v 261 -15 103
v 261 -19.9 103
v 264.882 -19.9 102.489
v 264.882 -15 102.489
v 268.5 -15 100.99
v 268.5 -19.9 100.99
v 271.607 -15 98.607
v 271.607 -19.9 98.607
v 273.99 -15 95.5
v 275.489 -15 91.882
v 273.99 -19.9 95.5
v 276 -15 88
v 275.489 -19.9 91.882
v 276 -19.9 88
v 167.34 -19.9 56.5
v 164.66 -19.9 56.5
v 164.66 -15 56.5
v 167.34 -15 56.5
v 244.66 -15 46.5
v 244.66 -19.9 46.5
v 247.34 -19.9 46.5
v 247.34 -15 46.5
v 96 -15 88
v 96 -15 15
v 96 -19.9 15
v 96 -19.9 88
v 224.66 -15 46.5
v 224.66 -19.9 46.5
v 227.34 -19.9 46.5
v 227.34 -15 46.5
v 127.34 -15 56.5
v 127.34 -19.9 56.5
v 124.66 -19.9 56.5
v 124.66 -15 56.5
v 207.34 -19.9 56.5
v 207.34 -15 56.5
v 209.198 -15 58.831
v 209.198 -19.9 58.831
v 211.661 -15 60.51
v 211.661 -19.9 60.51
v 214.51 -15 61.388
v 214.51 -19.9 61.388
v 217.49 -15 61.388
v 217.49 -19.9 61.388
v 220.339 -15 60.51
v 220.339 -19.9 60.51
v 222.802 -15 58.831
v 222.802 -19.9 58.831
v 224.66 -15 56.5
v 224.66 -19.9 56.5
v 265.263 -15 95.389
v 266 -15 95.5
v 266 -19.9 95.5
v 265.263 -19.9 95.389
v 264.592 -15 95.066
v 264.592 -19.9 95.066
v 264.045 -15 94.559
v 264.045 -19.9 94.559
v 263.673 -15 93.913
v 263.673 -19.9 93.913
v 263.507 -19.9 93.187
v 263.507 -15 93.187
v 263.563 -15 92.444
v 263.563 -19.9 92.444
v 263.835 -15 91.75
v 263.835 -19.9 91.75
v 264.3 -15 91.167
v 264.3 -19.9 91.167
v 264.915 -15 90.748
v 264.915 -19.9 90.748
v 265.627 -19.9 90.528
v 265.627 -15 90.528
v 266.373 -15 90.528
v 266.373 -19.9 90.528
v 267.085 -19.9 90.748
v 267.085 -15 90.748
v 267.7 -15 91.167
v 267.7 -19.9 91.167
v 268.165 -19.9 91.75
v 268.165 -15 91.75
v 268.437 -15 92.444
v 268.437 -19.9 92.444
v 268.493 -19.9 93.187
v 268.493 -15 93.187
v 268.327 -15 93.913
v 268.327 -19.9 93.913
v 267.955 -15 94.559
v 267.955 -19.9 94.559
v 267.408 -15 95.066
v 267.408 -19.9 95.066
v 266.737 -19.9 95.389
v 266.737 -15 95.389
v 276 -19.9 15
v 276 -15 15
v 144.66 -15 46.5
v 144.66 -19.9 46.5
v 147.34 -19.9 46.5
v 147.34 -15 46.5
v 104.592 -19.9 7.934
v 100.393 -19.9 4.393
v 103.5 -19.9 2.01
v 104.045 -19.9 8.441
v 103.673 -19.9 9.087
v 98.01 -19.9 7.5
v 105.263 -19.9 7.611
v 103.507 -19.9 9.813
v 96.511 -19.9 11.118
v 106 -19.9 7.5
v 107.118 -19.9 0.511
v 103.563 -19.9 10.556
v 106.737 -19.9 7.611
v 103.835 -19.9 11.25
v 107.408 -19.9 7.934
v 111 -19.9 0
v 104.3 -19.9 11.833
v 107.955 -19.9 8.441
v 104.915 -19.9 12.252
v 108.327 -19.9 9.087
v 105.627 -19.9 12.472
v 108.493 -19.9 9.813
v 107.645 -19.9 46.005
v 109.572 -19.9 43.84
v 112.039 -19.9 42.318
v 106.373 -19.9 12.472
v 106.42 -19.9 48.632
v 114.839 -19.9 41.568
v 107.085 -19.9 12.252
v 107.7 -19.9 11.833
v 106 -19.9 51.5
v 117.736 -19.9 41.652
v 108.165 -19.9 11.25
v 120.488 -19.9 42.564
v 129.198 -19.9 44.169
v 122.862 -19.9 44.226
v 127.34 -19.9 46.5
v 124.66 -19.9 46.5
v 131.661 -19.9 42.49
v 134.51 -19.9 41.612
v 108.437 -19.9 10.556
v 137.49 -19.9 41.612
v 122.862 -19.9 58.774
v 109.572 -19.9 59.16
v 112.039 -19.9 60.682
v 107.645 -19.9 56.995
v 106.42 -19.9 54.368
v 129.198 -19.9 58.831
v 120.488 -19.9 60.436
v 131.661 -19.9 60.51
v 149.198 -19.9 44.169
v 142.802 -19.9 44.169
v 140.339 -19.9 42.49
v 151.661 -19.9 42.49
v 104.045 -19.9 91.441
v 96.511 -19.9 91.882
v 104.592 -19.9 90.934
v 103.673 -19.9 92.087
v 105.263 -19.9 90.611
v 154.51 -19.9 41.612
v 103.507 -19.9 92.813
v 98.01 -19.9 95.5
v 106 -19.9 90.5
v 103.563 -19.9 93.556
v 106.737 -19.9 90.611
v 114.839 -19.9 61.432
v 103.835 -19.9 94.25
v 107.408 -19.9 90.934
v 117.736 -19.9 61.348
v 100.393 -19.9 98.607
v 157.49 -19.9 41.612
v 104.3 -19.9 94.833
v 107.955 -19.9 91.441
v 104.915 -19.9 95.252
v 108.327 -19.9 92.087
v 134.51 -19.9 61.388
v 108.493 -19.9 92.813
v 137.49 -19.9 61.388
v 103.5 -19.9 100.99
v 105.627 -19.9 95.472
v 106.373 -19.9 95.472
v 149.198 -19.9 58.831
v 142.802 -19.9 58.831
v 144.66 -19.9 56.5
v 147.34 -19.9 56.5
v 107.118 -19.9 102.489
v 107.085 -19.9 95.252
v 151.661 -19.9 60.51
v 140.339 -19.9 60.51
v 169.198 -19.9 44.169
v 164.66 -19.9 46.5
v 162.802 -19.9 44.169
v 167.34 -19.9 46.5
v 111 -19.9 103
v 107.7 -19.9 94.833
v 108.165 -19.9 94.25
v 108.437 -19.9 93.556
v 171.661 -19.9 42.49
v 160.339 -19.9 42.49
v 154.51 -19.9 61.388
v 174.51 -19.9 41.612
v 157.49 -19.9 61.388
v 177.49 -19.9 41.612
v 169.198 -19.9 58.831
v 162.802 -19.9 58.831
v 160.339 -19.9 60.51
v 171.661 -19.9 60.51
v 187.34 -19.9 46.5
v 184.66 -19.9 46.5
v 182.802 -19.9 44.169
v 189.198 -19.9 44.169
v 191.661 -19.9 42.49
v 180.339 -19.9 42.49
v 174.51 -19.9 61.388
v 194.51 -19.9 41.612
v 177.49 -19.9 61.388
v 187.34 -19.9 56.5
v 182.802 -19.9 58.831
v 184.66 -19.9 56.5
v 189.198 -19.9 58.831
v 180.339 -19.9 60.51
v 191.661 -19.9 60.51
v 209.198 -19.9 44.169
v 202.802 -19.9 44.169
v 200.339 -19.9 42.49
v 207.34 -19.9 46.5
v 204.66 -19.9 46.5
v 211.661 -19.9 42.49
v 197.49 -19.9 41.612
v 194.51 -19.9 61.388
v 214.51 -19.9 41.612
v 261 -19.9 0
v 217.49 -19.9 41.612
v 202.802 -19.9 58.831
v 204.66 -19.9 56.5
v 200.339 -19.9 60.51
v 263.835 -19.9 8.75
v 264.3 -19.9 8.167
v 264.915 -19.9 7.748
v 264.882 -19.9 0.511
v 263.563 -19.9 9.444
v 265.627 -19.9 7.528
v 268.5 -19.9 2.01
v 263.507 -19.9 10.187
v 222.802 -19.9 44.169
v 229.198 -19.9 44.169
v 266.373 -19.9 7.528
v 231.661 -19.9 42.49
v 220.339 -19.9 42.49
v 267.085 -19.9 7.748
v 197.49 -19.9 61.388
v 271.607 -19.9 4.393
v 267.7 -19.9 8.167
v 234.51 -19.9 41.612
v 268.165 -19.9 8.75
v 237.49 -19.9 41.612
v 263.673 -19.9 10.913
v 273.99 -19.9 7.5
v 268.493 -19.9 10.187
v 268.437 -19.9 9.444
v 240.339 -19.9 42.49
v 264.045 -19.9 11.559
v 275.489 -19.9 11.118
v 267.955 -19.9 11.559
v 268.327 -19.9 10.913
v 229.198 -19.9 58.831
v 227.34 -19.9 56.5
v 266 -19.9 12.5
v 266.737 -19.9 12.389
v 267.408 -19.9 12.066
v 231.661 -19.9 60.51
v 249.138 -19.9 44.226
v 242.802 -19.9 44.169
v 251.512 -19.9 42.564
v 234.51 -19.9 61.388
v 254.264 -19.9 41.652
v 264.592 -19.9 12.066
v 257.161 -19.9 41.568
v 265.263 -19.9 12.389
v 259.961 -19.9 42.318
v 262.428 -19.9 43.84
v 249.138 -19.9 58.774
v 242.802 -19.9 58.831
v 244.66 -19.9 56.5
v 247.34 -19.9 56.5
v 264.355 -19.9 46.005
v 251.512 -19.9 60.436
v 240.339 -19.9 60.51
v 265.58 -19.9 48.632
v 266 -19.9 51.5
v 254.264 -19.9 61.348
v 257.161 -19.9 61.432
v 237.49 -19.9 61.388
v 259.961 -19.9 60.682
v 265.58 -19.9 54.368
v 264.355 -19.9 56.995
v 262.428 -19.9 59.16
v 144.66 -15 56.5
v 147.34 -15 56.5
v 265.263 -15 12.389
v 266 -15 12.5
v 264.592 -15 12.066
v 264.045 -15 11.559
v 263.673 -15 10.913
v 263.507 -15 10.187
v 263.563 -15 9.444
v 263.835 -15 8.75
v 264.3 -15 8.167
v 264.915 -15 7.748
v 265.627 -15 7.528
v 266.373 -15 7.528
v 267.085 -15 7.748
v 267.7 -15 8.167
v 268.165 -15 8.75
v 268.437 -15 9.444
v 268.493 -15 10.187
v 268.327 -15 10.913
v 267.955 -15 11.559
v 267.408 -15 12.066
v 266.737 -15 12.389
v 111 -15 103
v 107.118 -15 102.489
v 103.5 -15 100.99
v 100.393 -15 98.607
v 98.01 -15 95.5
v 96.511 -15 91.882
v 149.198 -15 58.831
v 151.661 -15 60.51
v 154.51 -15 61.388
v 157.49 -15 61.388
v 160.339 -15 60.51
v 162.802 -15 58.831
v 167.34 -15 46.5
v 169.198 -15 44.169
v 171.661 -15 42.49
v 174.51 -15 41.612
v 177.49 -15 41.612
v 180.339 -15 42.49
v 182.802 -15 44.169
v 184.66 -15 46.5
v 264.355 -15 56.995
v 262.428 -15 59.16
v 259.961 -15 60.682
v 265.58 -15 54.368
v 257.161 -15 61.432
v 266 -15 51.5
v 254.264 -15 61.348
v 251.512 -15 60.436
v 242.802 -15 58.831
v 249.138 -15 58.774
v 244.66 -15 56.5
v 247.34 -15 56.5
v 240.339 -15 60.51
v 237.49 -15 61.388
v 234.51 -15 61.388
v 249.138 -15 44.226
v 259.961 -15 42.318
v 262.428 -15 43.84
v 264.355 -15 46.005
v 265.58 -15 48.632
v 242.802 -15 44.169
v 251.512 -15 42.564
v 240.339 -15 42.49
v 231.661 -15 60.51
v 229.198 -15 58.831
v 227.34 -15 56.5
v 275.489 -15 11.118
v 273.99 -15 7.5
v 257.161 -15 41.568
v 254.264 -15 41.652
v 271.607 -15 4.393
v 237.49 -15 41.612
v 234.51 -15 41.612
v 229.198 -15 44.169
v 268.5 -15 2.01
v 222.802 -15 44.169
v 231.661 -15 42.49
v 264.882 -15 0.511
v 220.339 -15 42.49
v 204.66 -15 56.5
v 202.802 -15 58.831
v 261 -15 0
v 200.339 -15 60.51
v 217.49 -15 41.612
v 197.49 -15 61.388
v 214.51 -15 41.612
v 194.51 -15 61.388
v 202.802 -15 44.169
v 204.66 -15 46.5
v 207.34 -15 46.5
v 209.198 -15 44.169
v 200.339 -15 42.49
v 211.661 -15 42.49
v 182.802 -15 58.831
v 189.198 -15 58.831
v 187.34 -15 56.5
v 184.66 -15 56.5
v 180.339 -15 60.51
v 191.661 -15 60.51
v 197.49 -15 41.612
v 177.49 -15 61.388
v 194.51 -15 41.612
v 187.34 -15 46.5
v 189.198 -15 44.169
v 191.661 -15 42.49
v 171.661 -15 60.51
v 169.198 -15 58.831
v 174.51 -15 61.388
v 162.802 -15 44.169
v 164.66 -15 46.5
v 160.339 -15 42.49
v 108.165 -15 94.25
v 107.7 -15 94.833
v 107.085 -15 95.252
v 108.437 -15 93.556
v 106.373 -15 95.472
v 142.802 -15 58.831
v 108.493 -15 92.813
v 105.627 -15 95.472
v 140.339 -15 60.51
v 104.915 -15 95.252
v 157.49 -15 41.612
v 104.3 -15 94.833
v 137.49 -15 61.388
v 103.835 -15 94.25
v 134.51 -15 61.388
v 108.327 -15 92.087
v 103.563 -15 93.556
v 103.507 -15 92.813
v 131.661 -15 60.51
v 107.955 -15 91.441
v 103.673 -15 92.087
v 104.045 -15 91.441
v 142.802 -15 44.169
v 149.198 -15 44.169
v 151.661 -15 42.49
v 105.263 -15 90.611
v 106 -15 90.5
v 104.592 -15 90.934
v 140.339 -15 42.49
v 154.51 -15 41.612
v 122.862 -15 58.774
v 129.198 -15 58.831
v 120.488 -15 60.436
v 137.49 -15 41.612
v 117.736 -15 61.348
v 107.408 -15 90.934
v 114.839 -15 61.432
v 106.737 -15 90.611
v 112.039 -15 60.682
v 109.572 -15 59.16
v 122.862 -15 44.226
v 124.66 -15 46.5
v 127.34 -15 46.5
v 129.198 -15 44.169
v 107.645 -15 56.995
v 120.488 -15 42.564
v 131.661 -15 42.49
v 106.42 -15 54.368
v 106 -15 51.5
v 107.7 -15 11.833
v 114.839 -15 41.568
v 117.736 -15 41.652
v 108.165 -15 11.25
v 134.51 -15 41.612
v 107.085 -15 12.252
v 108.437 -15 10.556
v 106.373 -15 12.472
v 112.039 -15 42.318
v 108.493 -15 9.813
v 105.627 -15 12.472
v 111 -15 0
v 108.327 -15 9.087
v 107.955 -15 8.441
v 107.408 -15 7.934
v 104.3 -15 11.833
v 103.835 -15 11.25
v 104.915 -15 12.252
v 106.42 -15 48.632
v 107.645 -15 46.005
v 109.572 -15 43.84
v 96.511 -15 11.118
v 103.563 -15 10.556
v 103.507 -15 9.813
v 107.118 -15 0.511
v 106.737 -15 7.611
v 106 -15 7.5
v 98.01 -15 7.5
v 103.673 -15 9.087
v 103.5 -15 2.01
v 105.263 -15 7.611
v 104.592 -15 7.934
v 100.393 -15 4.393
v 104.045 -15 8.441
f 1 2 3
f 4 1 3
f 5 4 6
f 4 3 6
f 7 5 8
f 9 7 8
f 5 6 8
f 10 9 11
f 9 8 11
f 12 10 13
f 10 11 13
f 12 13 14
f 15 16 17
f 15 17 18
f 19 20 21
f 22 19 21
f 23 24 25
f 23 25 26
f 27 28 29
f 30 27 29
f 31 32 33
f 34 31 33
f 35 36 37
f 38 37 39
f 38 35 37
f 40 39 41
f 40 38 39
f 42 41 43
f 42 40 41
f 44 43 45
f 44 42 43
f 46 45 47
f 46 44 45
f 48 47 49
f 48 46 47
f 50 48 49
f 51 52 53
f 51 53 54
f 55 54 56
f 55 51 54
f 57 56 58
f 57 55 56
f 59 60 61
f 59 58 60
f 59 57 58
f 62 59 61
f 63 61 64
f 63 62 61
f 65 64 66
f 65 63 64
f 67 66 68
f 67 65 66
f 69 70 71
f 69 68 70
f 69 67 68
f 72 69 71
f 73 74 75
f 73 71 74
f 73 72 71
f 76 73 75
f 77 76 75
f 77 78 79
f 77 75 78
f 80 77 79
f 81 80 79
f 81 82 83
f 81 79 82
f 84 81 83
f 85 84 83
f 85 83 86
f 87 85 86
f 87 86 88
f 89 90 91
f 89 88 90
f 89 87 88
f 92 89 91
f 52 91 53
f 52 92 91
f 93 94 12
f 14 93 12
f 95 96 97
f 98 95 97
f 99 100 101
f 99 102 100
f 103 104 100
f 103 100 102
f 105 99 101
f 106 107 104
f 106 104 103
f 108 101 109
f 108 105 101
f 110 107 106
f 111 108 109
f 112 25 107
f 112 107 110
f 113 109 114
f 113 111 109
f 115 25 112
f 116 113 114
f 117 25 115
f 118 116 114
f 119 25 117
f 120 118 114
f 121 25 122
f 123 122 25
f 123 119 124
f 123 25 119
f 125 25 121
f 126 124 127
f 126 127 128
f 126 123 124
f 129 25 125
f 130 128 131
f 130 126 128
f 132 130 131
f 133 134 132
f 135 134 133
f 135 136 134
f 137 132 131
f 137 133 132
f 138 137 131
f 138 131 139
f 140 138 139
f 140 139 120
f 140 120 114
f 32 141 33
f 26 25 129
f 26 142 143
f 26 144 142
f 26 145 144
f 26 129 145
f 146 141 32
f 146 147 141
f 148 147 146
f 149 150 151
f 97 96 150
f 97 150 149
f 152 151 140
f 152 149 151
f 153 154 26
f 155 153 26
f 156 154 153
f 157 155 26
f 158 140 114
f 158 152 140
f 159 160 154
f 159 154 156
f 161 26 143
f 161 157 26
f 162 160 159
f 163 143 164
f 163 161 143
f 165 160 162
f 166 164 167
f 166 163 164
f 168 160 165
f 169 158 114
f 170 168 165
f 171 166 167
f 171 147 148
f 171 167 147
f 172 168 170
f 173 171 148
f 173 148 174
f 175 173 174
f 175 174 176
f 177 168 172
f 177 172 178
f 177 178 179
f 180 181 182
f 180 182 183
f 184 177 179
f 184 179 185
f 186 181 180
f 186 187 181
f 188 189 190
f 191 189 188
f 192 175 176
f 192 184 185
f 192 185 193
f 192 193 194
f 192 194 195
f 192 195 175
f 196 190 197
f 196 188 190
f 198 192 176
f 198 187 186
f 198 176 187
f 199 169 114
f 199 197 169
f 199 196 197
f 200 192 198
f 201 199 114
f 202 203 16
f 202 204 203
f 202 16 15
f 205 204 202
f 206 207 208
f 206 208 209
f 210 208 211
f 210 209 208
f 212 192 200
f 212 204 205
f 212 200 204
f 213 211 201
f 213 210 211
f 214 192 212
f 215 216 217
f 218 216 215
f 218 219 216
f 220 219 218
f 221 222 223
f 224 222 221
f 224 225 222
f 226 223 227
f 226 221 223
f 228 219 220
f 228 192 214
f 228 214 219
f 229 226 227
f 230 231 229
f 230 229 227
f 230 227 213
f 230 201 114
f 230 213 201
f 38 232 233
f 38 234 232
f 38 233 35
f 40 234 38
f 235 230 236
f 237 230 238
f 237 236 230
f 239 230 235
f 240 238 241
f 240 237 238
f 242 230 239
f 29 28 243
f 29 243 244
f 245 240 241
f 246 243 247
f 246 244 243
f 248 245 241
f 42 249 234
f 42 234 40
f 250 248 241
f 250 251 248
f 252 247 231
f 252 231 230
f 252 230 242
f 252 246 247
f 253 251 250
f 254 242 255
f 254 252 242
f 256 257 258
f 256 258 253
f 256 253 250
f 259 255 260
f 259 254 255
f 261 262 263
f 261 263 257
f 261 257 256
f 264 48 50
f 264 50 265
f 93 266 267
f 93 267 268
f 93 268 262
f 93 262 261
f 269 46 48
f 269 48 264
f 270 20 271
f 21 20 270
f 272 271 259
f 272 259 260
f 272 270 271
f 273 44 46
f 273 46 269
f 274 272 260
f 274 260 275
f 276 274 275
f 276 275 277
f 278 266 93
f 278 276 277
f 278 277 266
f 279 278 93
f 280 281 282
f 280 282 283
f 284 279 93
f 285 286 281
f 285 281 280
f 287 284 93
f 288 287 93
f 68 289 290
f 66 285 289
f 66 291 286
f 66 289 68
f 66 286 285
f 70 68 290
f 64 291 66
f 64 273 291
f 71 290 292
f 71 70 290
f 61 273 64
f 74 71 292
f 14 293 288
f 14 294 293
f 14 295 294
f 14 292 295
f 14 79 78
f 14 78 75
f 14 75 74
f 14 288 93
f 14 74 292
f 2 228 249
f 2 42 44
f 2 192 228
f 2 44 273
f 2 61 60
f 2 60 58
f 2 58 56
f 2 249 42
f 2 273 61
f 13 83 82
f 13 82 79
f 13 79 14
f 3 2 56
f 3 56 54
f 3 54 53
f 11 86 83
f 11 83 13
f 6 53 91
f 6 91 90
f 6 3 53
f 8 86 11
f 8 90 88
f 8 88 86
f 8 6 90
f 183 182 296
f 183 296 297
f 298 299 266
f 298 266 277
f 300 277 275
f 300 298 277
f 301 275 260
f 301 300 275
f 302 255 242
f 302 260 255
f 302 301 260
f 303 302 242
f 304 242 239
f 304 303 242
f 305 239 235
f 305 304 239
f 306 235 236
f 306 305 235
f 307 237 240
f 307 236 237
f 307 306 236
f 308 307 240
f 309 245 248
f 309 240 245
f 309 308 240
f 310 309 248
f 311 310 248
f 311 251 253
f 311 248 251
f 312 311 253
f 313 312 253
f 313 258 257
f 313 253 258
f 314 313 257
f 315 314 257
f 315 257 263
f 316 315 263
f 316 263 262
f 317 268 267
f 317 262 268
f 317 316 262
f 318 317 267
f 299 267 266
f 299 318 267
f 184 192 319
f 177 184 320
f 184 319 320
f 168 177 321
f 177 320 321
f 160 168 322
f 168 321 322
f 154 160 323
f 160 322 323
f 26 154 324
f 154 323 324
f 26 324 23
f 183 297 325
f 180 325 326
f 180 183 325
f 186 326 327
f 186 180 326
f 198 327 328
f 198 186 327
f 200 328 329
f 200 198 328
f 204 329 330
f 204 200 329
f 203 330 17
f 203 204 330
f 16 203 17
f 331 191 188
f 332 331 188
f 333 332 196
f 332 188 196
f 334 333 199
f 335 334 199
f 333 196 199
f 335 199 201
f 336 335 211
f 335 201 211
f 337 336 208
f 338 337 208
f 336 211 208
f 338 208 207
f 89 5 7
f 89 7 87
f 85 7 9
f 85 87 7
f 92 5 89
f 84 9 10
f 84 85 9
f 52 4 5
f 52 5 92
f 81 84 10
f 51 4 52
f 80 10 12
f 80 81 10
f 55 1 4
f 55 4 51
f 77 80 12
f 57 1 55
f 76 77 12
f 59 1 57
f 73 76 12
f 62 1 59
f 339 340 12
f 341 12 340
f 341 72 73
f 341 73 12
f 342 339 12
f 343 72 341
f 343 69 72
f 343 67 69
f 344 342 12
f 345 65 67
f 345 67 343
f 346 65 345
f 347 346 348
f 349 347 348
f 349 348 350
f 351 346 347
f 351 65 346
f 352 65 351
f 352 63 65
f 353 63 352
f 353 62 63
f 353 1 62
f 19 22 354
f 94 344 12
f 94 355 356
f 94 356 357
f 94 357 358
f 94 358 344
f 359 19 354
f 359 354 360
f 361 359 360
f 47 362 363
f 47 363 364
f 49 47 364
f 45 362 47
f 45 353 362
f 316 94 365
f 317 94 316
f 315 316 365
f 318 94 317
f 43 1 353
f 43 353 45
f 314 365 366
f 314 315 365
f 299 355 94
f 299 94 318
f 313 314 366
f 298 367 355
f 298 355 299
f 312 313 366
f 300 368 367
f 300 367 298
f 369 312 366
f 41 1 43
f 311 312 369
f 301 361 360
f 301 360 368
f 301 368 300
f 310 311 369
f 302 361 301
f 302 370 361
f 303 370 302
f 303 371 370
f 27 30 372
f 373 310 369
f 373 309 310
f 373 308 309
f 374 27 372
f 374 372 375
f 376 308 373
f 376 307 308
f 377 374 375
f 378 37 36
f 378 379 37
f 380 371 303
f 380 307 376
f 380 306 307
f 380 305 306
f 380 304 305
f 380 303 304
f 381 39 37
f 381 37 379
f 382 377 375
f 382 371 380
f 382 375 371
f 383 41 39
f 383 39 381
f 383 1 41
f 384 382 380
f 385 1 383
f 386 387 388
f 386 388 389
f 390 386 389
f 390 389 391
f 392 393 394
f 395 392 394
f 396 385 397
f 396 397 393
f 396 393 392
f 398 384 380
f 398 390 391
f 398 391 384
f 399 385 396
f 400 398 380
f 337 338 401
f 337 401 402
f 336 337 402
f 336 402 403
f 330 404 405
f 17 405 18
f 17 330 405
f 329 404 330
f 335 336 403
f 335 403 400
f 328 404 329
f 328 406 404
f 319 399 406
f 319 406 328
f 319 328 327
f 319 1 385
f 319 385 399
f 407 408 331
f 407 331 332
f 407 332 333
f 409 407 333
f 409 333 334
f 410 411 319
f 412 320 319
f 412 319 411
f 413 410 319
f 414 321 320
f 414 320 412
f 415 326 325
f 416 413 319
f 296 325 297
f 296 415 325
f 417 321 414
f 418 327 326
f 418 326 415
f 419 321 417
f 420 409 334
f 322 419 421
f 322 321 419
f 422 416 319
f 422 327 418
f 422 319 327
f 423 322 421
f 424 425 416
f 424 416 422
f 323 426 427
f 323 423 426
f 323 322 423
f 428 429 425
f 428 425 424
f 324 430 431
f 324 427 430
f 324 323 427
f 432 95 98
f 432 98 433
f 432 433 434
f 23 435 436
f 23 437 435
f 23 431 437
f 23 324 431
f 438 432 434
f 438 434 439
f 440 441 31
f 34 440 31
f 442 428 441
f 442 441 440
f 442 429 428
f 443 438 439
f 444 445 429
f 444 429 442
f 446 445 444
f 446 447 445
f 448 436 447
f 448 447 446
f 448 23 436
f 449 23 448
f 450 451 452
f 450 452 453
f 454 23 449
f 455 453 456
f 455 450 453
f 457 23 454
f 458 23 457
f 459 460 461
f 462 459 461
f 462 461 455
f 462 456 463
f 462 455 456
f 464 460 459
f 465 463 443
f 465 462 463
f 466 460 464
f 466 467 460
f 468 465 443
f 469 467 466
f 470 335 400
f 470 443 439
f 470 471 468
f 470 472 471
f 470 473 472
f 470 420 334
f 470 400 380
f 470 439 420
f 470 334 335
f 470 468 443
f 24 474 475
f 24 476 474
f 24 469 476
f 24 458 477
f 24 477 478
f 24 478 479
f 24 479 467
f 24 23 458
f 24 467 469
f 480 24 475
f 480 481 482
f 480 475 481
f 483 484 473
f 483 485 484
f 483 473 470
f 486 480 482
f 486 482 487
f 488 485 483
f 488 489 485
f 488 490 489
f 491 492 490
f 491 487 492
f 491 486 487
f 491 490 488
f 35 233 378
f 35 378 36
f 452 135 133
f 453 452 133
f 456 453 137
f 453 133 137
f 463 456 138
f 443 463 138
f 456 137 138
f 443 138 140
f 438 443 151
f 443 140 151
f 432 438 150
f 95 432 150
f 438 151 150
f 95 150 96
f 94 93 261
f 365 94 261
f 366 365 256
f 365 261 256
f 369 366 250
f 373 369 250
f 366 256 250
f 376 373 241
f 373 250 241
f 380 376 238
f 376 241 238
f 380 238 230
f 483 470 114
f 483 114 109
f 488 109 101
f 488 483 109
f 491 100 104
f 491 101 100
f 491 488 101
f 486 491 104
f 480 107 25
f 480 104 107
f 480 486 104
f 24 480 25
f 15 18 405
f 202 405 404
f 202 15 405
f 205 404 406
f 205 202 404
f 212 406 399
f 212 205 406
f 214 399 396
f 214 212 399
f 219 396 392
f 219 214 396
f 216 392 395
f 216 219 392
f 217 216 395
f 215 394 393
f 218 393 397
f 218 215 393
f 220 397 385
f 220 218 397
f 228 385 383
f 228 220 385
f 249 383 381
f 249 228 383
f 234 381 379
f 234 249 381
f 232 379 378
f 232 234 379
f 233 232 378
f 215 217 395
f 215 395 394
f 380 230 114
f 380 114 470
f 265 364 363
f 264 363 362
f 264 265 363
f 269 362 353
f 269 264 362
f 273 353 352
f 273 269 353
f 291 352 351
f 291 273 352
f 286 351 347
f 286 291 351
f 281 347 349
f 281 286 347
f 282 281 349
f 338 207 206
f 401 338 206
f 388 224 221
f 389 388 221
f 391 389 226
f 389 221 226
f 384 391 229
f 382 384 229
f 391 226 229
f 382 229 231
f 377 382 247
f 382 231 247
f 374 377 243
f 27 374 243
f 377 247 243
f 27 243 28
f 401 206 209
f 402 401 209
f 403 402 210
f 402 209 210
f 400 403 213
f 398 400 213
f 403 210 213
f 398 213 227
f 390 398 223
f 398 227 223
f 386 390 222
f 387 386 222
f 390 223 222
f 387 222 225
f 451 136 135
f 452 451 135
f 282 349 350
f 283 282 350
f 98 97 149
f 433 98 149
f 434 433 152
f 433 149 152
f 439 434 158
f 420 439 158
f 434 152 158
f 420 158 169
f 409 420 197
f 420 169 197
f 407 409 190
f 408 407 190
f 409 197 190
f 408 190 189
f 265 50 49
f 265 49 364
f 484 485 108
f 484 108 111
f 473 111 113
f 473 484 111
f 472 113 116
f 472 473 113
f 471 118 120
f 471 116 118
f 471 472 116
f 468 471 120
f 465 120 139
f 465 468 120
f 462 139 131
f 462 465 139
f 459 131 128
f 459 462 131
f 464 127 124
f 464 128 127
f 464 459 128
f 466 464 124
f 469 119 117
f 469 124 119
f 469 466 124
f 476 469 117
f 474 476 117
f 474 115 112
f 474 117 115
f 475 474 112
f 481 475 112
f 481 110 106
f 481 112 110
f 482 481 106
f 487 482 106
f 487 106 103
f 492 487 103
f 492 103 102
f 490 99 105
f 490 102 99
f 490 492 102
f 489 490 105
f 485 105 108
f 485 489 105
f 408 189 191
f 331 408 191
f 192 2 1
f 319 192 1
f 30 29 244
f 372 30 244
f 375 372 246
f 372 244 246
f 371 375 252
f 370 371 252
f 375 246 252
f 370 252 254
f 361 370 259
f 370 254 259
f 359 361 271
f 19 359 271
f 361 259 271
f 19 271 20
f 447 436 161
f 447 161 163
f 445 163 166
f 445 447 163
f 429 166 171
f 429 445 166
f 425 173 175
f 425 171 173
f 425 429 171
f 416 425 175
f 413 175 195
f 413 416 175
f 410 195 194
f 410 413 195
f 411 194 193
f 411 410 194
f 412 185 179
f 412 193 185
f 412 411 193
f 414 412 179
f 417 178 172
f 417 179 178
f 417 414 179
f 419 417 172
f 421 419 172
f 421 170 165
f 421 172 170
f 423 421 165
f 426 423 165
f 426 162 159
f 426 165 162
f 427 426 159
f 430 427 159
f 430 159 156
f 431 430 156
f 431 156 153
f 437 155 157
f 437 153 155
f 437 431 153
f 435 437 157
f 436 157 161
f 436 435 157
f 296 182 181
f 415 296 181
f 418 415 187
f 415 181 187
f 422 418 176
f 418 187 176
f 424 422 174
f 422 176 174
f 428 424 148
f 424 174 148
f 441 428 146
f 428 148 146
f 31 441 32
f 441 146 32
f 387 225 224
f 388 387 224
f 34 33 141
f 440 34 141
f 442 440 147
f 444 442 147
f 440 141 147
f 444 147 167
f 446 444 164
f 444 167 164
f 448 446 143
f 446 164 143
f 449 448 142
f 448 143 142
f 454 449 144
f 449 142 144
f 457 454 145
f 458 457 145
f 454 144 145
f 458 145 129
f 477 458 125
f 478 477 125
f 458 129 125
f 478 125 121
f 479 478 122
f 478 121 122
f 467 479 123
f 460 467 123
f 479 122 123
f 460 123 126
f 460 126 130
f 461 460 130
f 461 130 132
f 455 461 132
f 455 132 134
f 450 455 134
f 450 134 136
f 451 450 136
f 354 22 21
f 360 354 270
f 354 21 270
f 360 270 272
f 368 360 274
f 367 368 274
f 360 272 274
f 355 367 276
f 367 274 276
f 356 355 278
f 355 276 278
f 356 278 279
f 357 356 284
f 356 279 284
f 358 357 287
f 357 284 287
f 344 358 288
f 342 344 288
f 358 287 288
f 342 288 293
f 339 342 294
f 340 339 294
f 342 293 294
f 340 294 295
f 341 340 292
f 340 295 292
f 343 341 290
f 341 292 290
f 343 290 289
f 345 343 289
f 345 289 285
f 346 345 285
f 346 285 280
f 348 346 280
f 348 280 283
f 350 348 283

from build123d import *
from build123d.topology import SkipClean

# Parameters (mm, degrees)
SALIENTE_EXTRUIR1_DEPTH     = 103
CROQUIS2_W                  = 5
CROQUIS2_H                  = 50
CROQUIS2_H_2                = 80
SALIENTE_EXTRUIR2_DEPTH     = 35
REDONDEO1_R                 = 5
REDONDEO2_R                 = 5
SALIENTE_EXTRUIR3_DEPTH     = 322
REDONDEO4_R                 = 10
REDONDEO5_R                 = 10
CORTAR_EXTRUIR1_DEPTH       = 384.597445247
CORTAR_EXTRUIR1_DEPTH_BACK  = 384.597445247
CROQUIS4_W                  = 120
CROQUIS4_H                  = 165.437368142
CROQUIS8_W                  = 103
CROQUIS8_H                  = 7
SALIENTE_EXTRUIR5_DEPTH     = 200
REDONDEO6_R                 = 15
CROQUIS10_R                 = 2.5
CORTAR_EXTRUIR5_DEPTH       = 289.46836915
CORTAR_EXTRUIR6_DEPTH       = 10
SALIENTE_EXTRUIR6_DEPTH     = 12
CROQUIS12_W                 = 103
CROQUIS12_H                 = 5
SALIENTE_EXTRUIR7_DEPTH     = 41
REDONDEO7_R                 = 10
CORTAR_EXTRUIR7_DEPTH       = 384.597445247
CORTAR_EXTRUIR7_DEPTH_BACK  = 384.597445247
CROQUIS13_W                 = 211.982826688
CROQUIS13_H                 = 7
REDONDEO8_R                 = 5
CORTAR_EXTRUIR9_DEPTH       = 386.127251697
CORTAR_EXTRUIR9_DEPTH_BACK  = 386.127251697
CROQUIS14_W                 = 102.672801221
CROQUIS14_H                 = 112.094986942
REDONDEO9_R                 = 15
CORTAR_EXTRUIR10_DEPTH      = 295.63536787
CORTAR_EXTRUIR10_DEPTH_BACK = 295.63536787
CROQUIS15_R                 = 2.5
CORTAR_EXTRUIR11_DEPTH      = 0.1


# Some blends are built 0.0001 mm under size
with BuildPart() as part:
    # Croquis1 → Saliente-Extruir1 (new body)
    with BuildSketch(Plane.XY):
        with BuildLine():
            Line((0, 0), (0, -5))
            ThreePointArc((0, -5), (4.393398282, -15.606601718), (15, -20))
            Line((15, -20), (337, -20))
            ThreePointArc((337, -20), (347.606601718, -15.606601718), (352, -5))
            Line((352, -5), (352, 0))
            Line((352, 0), (367, 0))
            Line((367, 0), (367, -5))
            ThreePointArc((367, -5), (358.213203436, -26.213203436), (337, -35))
            Line((337, -35), (15, -35))
            ThreePointArc((15, -35), (-6.213203436, -26.213203436), (-15, -5))
            Line((-15, -5), (-15, 0))
            Line((-15, 0), (0, 0))
        make_face()
    extrude(amount=SALIENTE_EXTRUIR1_DEPTH)

    # Croquis2 → Saliente-Extruir2 (add)
    with BuildSketch(Plane(origin=(0, 0, 0), x_dir=(1, 0, 0), z_dir=(0, 1, 0))):
        with Locations((-7.5, -50.145888002)):
            Rectangle(CROQUIS2_W, CROQUIS2_H)
        with Locations((359.5, -51.5)):
            Rectangle(CROQUIS2_W, CROQUIS2_H_2)
    extrude(amount=SALIENTE_EXTRUIR2_DEPTH)

    # Redondeo1
    redondeo1_edges = [part.edges().sort_by_distance(p)[0] for p in [
        (-10, 0, 50.145888002),
        (-7.5, 0, 75.145888002),
        (-5, 0, 50.145888002),
        (-7.5, 0, 25.145888002),
        (357, 0, 51.5),
        (359.5, 0, 91.5),
        (362, 0, 51.5),
        (359.5, 0, 11.5),
    ]]
    fillet(redondeo1_edges, radius=REDONDEO1_R - 0.0001)  # a hair under: the kernel refuses the full size

    # Redondeo2
    redondeo2_edges = [part.edges().sort_by_distance(p)[0] for p in [
        (-7.5, 35, 75.145888002),
        (-7.5, 35, 25.145888002),
        (359.5, 35, 91.5),
        (359.5, 35, 11.5),
    ]]
    fillet(redondeo2_edges, radius=REDONDEO2_R)

    # Croquis3 → Saliente-Extruir3 (add)
    with BuildSketch(Plane(origin=(15, 0, 0), x_dir=(0, 0, -1), z_dir=(1, 0, 0))):
        Polygon((-76.5, -35), (-70.5, -35), (-70.5, -37), (-32.5, -37), (-32.5, -35), (-26.5, -35), (-26.5, -43), (-76.5, -43), align=None)
    extrude(amount=SALIENTE_EXTRUIR3_DEPTH)

    # Redondeo4
    # the kernel refuses this fillet: 10 mm, written as the material it adds along each edge
    with BuildSketch(Plane(origin=(15, -35, 76.5), x_dir=(0, 0, 1), z_dir=(1, 0, 0))) as redondeo4_piece_1:
        with BuildLine():
            CenterArc((9.797958971, 10), REDONDEO4_R, 191.536959033, 78.463040967)
            Line((0, 8), (-0.195959179, 7.96))
            ThreePointArc((-0.195959179, 7.96), (-0.2, 4), (-0.2, 0))
            Line((-0.2, 0), (0, -0.2))
            Line((0, -0.2), (9.797958971, -0.2))
            Line((9.797958971, -0.2), (9.797958971, 0))
        make_face()
    extrude(amount=322)
    with BuildSketch(Plane(origin=(15, -35, 26.5), x_dir=(0, 0, -1), z_dir=(1, 0, 0))) as redondeo4_piece_2:
        with BuildLine():
            CenterArc((9.797958971, -10), REDONDEO4_R, 90, 78.463040967)
            Line((0, -8), (-0.195959179, -7.96))
            ThreePointArc((-0.195959179, -7.96), (-0.2, -4), (-0.2, 0))
            Line((-0.2, 0), (0, 0.2))
            Line((0, 0.2), (9.797958971, 0.2))
            Line((9.797958971, 0.2), (9.797958971, 0))
        make_face()
    extrude(amount=322)

    # Redondeo5
    redondeo5_edges = [part.edges().sort_by_distance(p)[0] for p in [
        (176, -43, 76.5),
        (176, -43, 26.5),
    ]]
    fillet(redondeo5_edges, radius=REDONDEO5_R)

    # Croquis4 → Cortar-Extruir1 (cut, two sides: drawn at the far end of the back side and taken through both)
    with BuildSketch(Plane.XY.offset(103).offset(-CORTAR_EXTRUIR1_DEPTH_BACK)):
        with Locations((236, 7.126913707)):
            Rectangle(CROQUIS4_W, CROQUIS4_H)
    extrude(amount=CORTAR_EXTRUIR1_DEPTH + CORTAR_EXTRUIR1_DEPTH_BACK, mode=Mode.SUBTRACT)


with BuildPart() as body_2:
    # of the pieces the cut leaves, the one that is kept (cortar_extruir1_keep)
    add(part.part.solids().sort_by_distance((296, -39, 24.702041029))[0])

    # Croquis8 → Saliente-Extruir5 (add)
    with BuildSketch(Plane.ZY.offset(-296)):
        with Locations((51.5, -23.5)):
            Rectangle(CROQUIS8_W, CROQUIS8_H)
    extrude(amount=SALIENTE_EXTRUIR5_DEPTH)

    # Redondeo6
    redondeo6_edges = [body_2.edges().sort_by_distance(p)[0] for p in [
        (96, -23.5, 103),
        (96, -23.5, 0),
    ]]
    fillet(redondeo6_edges, radius=REDONDEO6_R)

    # Croquis10 → Cortar-Extruir5 (cut, through all)
    with BuildSketch(Plane(origin=(362, 0, 0), x_dir=(0, 0, -1), z_dir=(1, 0, 0))):
        with Locations(Location((-80.5, 20, 0), (0, 0, 90))):
            Circle(CROQUIS10_R)
        with Locations(Location((-22.5, 20, 0), (0, 0, 90))):
            Circle(CROQUIS10_R)
    extrude(amount=-CORTAR_EXTRUIR5_DEPTH, mode=Mode.SUBTRACT)

    # Croquis9 → Cortar-Extruir6 (cut)
    with BuildSketch(Plane.XZ.offset(27)):
        with BuildLine():
            Line((144.660254038, 56.5), (147.339745962, 56.5))
            ThreePointArc((147.339745962, 56.5), (156, 61.5), (164.660254038, 56.5))
            Line((164.660254038, 56.5), (167.339745962, 56.5))
            ThreePointArc((167.339745962, 56.5), (176, 61.5), (184.660254038, 56.5))
            Line((184.660254038, 56.5), (187.339745962, 56.5))
            ThreePointArc((187.339745962, 56.5), (196, 61.5), (204.660254038, 56.5))
            Line((204.660254038, 56.5), (207.339745962, 56.5))
            ThreePointArc((207.339745962, 56.5), (216, 61.5), (224.660254038, 56.5))
            Line((224.660254038, 56.5), (227.339745962, 56.5))
            ThreePointArc((227.339745962, 56.5), (236, 61.5), (244.660254038, 56.5))
            Line((244.660254038, 56.5), (247.339745962, 56.5))
            ThreePointArc((247.339745962, 56.5), (266, 51.5), (247.339745962, 46.5))
            Line((247.339745962, 46.5), (244.660254038, 46.5))
            ThreePointArc((244.660254038, 46.5), (236, 41.5), (227.339745962, 46.5))
            Line((227.339745962, 46.5), (224.660254038, 46.5))
            ThreePointArc((224.660254038, 46.5), (216, 41.5), (207.339745962, 46.5))
            Line((207.339745962, 46.5), (204.660254038, 46.5))
            ThreePointArc((204.660254038, 46.5), (196, 41.5), (187.339745962, 46.5))
            Line((187.339745962, 46.5), (184.660254038, 46.5))
            ThreePointArc((184.660254038, 46.5), (176, 41.5), (167.339745962, 46.5))
            Line((167.339745962, 46.5), (164.660254038, 46.5))
            ThreePointArc((164.660254038, 46.5), (156, 41.5), (147.339745962, 46.5))
            Line((147.339745962, 46.5), (144.660254038, 46.5))
            ThreePointArc((144.660254038, 46.5), (136, 41.5), (127.339745962, 46.5))
            Line((127.339745962, 46.5), (124.660254038, 46.5))
            ThreePointArc((124.660254038, 46.5), (106, 51.5), (124.660254038, 56.5))
            Line((124.660254038, 56.5), (127.339745962, 56.5))
            ThreePointArc((127.339745962, 56.5), (136, 61.5), (144.660254038, 56.5))
        make_face()
    extrude(amount=-CORTAR_EXTRUIR6_DEPTH, mode=Mode.SUBTRACT)

    # Croquis11 → Saliente-Extruir6 (add)
    with BuildSketch(Plane.XZ.offset(27)):
        with BuildLine():
            Line((96, 88), (96, 15))
            ThreePointArc((96, 15), (100.393398282, 4.393398282), (111, 0))
            Line((111, 0), (296, 0))
            Line((296, 0), (296, 103))
            Line((296, 103), (111, 103))
            ThreePointArc((111, 103), (100.393398282, 98.606601718), (96, 88))
        make_face()
        with BuildLine():
            Line((247.339745962, 56.5), (244.660254038, 56.5))
            ThreePointArc((244.660254038, 56.5), (236, 61.5), (227.339745962, 56.5))
            Line((227.339745962, 56.5), (224.660254038, 56.5))
            ThreePointArc((224.660254038, 56.5), (216, 61.5), (207.339745962, 56.5))
            Line((207.339745962, 56.5), (204.660254038, 56.5))
            ThreePointArc((204.660254038, 56.5), (196, 61.5), (187.339745962, 56.5))
            Line((187.339745962, 56.5), (184.660254038, 56.5))
            ThreePointArc((184.660254038, 56.5), (176, 61.5), (167.339745962, 56.5))
            Line((167.339745962, 56.5), (164.660254038, 56.5))
            ThreePointArc((164.660254038, 56.5), (156, 61.5), (147.339745962, 56.5))
            Line((147.339745962, 56.5), (144.660254038, 56.5))
            ThreePointArc((144.660254038, 56.5), (136, 61.5), (127.339745962, 56.5))
            Line((127.339745962, 56.5), (124.660254038, 56.5))
            ThreePointArc((124.660254038, 56.5), (106, 51.5), (124.660254038, 46.5))
            Line((124.660254038, 46.5), (127.339745962, 46.5))
            ThreePointArc((127.339745962, 46.5), (136, 41.5), (144.660254038, 46.5))
            Line((144.660254038, 46.5), (147.339745962, 46.5))
            ThreePointArc((147.339745962, 46.5), (156, 41.5), (164.660254038, 46.5))
            Line((164.660254038, 46.5), (167.339745962, 46.5))
            ThreePointArc((167.339745962, 46.5), (176, 41.5), (184.660254038, 46.5))
            Line((184.660254038, 46.5), (187.339745962, 46.5))
            ThreePointArc((187.339745962, 46.5), (196, 41.5), (204.660254038, 46.5))
            Line((204.660254038, 46.5), (207.339745962, 46.5))
            ThreePointArc((207.339745962, 46.5), (216, 41.5), (224.660254038, 46.5))
            Line((224.660254038, 46.5), (227.339745962, 46.5))
            ThreePointArc((227.339745962, 46.5), (236, 41.5), (244.660254038, 46.5))
            Line((244.660254038, 46.5), (247.339745962, 46.5))
            ThreePointArc((247.339745962, 46.5), (266, 51.5), (247.339745962, 56.5))
        make_face(mode=Mode.SUBTRACT)
    extrude(amount=-SALIENTE_EXTRUIR6_DEPTH)

    # Croquis12 → Saliente-Extruir7 (add)
    with SkipClean():  # the faces are left unmerged after this step: merging them gives an invalid solid
        with BuildSketch(Plane(origin=(296, 0, 0), x_dir=(0, 0, -1), z_dir=(1, 0, 0))):
            with Locations((-51.5, -17.5)):
                Rectangle(CROQUIS12_W, CROQUIS12_H)
        extrude(amount=SALIENTE_EXTRUIR7_DEPTH)
    add(body_2.part.scale(1), mode=Mode.REPLACE)  # the faces are merged on a copy

    # Redondeo7
    # the kernel refuses this fillet: 10 mm, written as the material it takes off along each edge
    with BuildSketch(Plane(origin=(337, -15, -21.650635095), x_dir=(0, -1, 0), z_dir=(0, 0, 1))) as redondeo7_piece_1:
        with BuildLine():
            CenterArc((10, -8.660254038), REDONDEO7_R, 120, 60)
            Line((0, -8.660254038), (-0.2, -8.660254038))
            Line((-0.2, -8.660254038), (-0.2, 0))
            Line((-0.2, 0), (0, 0.2))
            ThreePointArc((0, 0.2), (2.5, 0.2), (4.9, 0.173205081))
            Line((4.9, 0.173205081), (5, 0))
        make_face()
    extrude(amount=146.301270189, mode=Mode.SUBTRACT)

    # Croquis13 → Cortar-Extruir7 (cut, two sides: drawn at the far end of the back side and taken through both)
    with BuildSketch(Plane.XY.offset(103).offset(-CORTAR_EXTRUIR7_DEPTH_BACK)):
        with Locations((190.008586656, -23.5)):
            Rectangle(CROQUIS13_W, CROQUIS13_H)
    extrude(amount=CORTAR_EXTRUIR7_DEPTH + CORTAR_EXTRUIR7_DEPTH_BACK, mode=Mode.SUBTRACT)

    # Redondeo8
    redondeo8_edges = [body_2.edges().sort_by_distance(p)[0] for p in [
        (296, -20, 51.5),
    ]]
    fillet(redondeo8_edges, radius=REDONDEO8_R)

    # Croquis14 → Cortar-Extruir9 (cut, two sides: drawn at the far end of the back side and taken through both)
    with BuildSketch(Plane.XZ.offset(20).offset(-CORTAR_EXTRUIR9_DEPTH_BACK)):
        with Locations((327.336400611, 46.952506529)):
            Rectangle(CROQUIS14_W, CROQUIS14_H)
    extrude(amount=CORTAR_EXTRUIR9_DEPTH + CORTAR_EXTRUIR9_DEPTH_BACK, mode=Mode.SUBTRACT)

    # Redondeo9
    redondeo9_edges = [body_2.edges().sort_by_distance(p)[0] for p in [
        (276, -17.5, 0),
        (276, -17.5, 103),
    ]]
    fillet(redondeo9_edges, radius=REDONDEO9_R)

    # Croquis15 → Cortar-Extruir10 (cut, two sides: drawn at the far end of the back side and taken through both)
    with BuildSketch(Plane.XZ.offset(20).offset(-CORTAR_EXTRUIR10_DEPTH_BACK)):
        with Locations(Location((106, 93, 0), (0, 0, 270))):
            Circle(CROQUIS15_R)
        with Locations(Location((106, 10, 0), (0, 0, 270))):
            Circle(CROQUIS15_R)
        with Locations(Location((266, 10, 0), (0, 0, 90))):
            Circle(CROQUIS15_R)
        with Locations(Location((266, 93, 0), (0, 0, 90))):
            Circle(CROQUIS15_R)
    extrude(amount=CORTAR_EXTRUIR10_DEPTH + CORTAR_EXTRUIR10_DEPTH_BACK, mode=Mode.SUBTRACT)

    # Croquis16 → Cortar-Extruir11 (cut)
    with BuildSketch(Plane.XZ.offset(20)):
        with BuildLine():
            Line((111, 0), (261, 0))
            ThreePointArc((261, 0), (271.606601718, 4.393398282), (276, 15))
            Line((276, 15), (276, 88))
            ThreePointArc((276, 88), (271.606601718, 98.606601718), (261, 103))
            Line((261, 103), (111, 103))
            ThreePointArc((111, 103), (100.393398282, 98.606601718), (96, 88))
            Line((96, 88), (96, 15))
            ThreePointArc((96, 15), (100.393398282, 4.393398282), (111, 0))
        make_face()
    extrude(amount=-CORTAR_EXTRUIR11_DEPTH, mode=Mode.SUBTRACT)


solid = body_2.part
